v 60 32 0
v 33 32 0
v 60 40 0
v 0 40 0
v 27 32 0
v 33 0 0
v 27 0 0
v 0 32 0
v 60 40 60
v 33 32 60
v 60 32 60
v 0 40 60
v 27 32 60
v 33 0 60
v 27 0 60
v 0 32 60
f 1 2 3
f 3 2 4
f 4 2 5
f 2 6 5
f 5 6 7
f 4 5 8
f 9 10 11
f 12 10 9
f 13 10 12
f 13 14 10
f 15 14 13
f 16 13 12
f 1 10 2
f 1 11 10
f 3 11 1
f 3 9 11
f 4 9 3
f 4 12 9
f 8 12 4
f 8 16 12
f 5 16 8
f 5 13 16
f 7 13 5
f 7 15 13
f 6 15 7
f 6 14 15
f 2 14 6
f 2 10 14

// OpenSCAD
$fn = 32;

// ----------------------------------------------------------------------
// Structural section: tee 60 x 40 mm
// ----------------------------------------------------------------------

// --- parameters (mm) ---
sec_w = 60;               // tee width, X
sec_h = 40;               // tee height, Y
flange_t = 8;             // top flange thickness
web_t = 6;                // web thickness
plate_t = 60;             // cut length, Z (extrusion height)

profile = [[27, 0], [33, 0], [33, 32], [60, 32], [60, 40], [0, 40], [0, 32], [27, 32]];  // primary outline, 8 points, counter clockwise

// --- the one profile operation ---
linear_extrude(height = plate_t) polygon(points = profile);
